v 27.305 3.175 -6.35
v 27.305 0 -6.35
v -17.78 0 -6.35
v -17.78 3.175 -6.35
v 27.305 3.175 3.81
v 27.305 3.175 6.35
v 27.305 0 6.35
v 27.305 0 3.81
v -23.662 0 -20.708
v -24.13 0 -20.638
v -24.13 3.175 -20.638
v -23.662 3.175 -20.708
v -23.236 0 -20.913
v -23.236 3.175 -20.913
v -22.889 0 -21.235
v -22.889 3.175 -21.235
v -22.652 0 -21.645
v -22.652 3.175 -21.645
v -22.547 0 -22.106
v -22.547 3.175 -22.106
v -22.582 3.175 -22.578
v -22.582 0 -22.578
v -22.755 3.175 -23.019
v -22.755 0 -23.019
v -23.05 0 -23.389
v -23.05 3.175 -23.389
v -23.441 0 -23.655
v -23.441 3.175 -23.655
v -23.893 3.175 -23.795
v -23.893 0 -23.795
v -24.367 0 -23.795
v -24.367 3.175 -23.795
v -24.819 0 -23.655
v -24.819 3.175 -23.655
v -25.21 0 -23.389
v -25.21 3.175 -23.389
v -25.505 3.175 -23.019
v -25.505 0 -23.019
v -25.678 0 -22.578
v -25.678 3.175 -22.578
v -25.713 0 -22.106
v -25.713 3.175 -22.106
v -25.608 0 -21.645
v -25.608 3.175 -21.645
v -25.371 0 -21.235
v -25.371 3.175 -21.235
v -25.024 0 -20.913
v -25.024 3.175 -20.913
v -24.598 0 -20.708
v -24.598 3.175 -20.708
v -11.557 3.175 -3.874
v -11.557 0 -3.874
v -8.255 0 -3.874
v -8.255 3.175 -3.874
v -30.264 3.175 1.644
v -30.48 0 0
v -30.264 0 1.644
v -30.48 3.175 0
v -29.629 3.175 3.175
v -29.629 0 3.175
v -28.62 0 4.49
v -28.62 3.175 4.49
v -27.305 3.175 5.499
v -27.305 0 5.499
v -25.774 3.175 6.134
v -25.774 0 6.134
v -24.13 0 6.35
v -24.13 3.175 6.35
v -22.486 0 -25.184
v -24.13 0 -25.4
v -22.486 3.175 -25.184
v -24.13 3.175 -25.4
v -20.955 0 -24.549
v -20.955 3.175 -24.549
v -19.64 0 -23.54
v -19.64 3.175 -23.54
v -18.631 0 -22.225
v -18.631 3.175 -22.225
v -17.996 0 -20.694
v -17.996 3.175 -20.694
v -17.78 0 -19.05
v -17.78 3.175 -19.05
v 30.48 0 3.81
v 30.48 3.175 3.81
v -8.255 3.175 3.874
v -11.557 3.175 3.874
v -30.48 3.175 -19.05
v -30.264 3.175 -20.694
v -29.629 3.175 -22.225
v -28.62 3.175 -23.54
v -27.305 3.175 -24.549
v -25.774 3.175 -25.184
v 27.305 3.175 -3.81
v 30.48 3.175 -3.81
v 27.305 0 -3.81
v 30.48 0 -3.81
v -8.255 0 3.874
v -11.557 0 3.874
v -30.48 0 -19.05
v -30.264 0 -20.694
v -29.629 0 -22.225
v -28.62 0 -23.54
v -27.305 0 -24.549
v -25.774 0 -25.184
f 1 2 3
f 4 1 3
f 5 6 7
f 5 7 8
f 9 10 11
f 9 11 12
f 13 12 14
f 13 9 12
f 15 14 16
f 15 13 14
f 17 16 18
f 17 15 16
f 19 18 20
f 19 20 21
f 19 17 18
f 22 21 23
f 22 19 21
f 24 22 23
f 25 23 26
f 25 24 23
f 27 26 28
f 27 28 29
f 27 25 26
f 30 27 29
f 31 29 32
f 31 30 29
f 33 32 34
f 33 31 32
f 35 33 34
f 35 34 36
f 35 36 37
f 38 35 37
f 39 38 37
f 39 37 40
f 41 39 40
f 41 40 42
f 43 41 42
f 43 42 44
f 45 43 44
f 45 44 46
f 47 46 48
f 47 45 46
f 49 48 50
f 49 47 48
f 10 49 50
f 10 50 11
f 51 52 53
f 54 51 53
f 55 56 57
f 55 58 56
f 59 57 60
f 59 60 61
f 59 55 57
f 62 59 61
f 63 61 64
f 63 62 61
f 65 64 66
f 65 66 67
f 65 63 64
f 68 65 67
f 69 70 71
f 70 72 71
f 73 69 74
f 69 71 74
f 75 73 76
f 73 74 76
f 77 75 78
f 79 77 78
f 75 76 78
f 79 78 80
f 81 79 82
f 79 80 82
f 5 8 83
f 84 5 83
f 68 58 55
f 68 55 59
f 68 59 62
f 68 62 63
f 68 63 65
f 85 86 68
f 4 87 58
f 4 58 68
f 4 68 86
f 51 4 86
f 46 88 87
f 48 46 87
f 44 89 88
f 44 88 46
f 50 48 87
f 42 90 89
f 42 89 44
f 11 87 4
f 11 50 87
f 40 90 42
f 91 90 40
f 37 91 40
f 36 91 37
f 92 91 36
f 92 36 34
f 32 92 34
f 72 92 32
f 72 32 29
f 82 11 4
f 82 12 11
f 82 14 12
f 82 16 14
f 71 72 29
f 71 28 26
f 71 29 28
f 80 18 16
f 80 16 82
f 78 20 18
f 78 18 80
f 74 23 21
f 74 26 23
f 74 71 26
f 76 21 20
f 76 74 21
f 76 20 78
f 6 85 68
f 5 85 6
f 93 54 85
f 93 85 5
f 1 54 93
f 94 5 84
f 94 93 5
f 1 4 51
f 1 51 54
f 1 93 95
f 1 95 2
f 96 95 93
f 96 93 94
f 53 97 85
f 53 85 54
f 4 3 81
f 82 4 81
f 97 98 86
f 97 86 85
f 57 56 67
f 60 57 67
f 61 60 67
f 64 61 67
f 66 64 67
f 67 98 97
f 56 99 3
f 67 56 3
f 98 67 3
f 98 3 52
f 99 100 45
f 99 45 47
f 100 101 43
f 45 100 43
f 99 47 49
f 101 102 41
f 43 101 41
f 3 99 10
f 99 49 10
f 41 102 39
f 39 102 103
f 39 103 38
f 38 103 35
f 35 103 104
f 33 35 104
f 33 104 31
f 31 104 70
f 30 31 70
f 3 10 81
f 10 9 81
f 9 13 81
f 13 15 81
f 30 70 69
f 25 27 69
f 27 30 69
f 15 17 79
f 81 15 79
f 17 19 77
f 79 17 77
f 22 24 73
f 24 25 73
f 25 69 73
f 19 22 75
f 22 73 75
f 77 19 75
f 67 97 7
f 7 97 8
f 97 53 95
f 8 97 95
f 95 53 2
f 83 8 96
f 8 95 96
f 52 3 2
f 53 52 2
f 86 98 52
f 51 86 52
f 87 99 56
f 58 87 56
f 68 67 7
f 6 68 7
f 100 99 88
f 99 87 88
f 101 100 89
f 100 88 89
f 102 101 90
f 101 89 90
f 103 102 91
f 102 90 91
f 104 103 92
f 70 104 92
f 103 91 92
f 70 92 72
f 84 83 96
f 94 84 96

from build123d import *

# Parameters (mm, degrees)
SKETCH1_R           = 1.5875
SKETCH1_W           = 3.302
SKETCH1_H           = 7.747
BOSS_EXTRUDE1_DEPTH = 3.175
SKETCH3_W           = 3.175
SKETCH3_H           = 2.54
CUT_EXTRUDE1_DEPTH  = 3.175
FILLET1_R           = 6.35
FILLET2_R           = 6.35
FILLET3_R           = 6.35


with BuildPart() as part:
    # Sketch1 → Boss-Extrude1 (new body)
    with BuildSketch(Plane(origin=(0, 0, 0), x_dir=(1, 0, 0), z_dir=(0, 1, 0))):
        Polygon((30.48, 6.35), (-17.78, 6.35), (-17.78, 25.4), (-30.48, 25.4), (-30.48, 6.35), (-30.48, -6.35), (30.48, -6.35), align=None)
        with Locations(Location((-24.13, 22.225, 0), (0, 0, 270))):
            Circle(SKETCH1_R, mode=Mode.SUBTRACT)
        with Locations((-9.906, 0)):
            Rectangle(SKETCH1_W, SKETCH1_H, mode=Mode.SUBTRACT)
    extrude(amount=BOSS_EXTRUDE1_DEPTH)

    # Sketch3 → Cut-Extrude1 (cut)
    with BuildSketch(Plane(origin=(0, 3.175, 0), x_dir=(1, 0, 0), z_dir=(0, 1, 0))):
        with Locations((28.8925, 5.08)):
            Rectangle(SKETCH3_W, SKETCH3_H)
        with Locations((28.8925, -5.08)):
            Rectangle(SKETCH3_W, SKETCH3_H)
    extrude(amount=-CUT_EXTRUDE1_DEPTH, mode=Mode.SUBTRACT)

    # Fillet1
    fillet1_edges = [part.edges().sort_by_distance(p)[0] for p in [
        (-30.48, 1.5875, -25.4),
    ]]
    fillet(fillet1_edges, radius=FILLET1_R)

    # Fillet2
    fillet2_edges = [part.edges().sort_by_distance(p)[0] for p in [
        (-17.78, 1.5875, -25.4),
    ]]
    fillet(fillet2_edges, radius=FILLET2_R - 0.0001)  # a hair under: the kernel refuses the full size

    # Fillet3
    fillet3_edges = [part.edges().sort_by_distance(p)[0] for p in [
        (-30.48, 1.5875, 6.35),
    ]]
    fillet(fillet3_edges, radius=FILLET3_R)


solid = part.part
